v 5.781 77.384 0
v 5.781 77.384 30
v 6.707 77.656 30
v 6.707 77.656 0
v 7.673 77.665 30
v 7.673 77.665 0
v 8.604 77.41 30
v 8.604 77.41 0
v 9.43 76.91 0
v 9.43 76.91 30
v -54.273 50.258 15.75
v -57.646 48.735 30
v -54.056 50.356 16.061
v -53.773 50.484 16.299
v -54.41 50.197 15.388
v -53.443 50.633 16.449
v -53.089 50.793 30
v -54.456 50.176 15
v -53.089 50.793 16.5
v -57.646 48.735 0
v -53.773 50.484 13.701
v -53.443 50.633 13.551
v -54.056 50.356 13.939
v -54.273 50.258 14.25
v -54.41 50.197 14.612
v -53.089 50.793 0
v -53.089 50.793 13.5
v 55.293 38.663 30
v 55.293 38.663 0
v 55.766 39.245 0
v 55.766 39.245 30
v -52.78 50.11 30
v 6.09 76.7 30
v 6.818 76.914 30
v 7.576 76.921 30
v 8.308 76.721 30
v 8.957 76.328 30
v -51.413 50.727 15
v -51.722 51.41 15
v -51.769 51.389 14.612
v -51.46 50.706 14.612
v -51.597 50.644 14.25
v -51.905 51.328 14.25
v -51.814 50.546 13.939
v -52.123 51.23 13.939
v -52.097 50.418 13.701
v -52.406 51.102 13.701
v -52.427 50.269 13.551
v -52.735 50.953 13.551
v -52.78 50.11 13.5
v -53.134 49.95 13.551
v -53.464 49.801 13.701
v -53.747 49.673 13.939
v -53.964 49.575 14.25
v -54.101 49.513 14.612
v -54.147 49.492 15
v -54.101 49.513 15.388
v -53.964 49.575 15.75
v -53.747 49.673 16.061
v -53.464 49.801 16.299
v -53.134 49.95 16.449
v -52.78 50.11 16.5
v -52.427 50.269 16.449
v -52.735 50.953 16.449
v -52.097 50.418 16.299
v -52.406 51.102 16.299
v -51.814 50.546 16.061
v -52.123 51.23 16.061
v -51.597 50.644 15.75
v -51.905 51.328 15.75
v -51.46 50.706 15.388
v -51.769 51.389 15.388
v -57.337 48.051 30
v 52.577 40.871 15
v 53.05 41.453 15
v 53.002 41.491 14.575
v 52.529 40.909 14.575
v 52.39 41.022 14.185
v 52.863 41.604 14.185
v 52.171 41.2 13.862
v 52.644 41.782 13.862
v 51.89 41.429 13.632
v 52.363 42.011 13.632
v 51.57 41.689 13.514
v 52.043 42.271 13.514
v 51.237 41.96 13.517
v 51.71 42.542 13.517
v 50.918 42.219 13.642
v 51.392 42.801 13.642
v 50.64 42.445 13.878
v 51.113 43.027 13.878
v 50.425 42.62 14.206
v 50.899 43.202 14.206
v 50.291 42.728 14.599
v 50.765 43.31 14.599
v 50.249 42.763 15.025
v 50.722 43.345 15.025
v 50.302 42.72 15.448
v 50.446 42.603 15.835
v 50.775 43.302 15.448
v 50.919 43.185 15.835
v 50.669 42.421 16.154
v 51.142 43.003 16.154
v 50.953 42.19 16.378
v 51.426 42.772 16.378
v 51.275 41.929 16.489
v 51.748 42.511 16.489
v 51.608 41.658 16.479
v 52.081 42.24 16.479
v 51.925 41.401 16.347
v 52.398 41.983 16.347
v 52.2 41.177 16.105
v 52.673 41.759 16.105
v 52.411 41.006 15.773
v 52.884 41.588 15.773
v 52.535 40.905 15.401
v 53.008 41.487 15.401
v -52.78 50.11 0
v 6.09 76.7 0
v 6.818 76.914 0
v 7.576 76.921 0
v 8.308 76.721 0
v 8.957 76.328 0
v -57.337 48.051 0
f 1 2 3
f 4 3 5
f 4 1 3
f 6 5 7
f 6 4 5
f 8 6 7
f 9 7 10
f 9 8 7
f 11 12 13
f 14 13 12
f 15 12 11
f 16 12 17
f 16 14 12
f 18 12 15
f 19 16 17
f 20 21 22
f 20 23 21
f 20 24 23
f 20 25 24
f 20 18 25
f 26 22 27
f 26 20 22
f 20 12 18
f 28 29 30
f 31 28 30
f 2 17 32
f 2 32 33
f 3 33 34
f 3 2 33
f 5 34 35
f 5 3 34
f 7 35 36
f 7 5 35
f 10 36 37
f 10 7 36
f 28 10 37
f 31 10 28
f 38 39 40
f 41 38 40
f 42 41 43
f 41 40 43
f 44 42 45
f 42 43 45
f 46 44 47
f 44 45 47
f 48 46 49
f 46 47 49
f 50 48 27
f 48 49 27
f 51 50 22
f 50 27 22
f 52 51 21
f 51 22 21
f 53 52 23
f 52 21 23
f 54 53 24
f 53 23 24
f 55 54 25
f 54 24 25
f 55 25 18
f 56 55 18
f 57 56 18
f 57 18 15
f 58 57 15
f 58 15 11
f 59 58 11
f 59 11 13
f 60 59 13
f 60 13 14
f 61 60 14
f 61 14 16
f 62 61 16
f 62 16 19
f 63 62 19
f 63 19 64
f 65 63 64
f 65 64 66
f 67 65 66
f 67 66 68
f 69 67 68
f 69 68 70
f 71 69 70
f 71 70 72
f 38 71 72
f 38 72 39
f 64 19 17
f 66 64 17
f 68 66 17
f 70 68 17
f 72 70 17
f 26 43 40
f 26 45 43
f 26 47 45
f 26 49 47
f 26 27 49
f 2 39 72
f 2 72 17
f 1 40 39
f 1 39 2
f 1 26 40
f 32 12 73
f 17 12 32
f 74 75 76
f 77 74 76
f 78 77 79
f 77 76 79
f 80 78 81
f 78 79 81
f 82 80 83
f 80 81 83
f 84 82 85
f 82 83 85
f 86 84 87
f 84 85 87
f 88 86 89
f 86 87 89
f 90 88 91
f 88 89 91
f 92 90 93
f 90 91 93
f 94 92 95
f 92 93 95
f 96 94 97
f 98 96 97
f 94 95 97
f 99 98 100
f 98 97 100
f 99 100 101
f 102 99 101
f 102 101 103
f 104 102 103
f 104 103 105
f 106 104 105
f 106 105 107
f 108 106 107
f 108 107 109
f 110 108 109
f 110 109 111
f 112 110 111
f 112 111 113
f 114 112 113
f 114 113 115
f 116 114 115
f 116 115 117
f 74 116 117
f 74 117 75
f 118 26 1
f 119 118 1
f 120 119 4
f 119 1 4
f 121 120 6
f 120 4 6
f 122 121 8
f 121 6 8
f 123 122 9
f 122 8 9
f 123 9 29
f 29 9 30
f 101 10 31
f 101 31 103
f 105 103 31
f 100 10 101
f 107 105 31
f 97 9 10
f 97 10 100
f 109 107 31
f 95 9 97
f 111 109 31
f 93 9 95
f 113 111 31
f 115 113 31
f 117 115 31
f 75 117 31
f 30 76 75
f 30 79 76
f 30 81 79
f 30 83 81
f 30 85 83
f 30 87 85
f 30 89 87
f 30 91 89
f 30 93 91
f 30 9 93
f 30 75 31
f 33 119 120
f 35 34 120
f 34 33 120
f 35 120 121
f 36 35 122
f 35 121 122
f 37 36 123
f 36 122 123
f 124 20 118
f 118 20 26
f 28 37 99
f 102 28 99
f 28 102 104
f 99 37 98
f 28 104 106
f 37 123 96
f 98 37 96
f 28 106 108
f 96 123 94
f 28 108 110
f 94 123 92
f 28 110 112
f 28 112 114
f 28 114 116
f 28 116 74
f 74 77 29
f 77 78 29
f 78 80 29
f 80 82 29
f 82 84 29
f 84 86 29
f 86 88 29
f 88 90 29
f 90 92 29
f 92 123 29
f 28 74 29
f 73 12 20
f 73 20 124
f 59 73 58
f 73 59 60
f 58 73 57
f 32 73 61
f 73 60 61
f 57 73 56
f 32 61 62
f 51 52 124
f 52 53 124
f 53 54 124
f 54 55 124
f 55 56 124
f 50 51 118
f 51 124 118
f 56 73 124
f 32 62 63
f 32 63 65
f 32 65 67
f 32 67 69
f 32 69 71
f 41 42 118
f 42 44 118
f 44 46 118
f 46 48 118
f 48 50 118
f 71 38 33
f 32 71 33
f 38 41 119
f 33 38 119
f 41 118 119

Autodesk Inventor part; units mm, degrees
ref_plane "YZ Plane" through (0, 0, 0) normal (1, 0, 0) x (0, 1, 0)
ref_plane "XZ Plane" through (0, 0, 0) normal (0, 1, 0) x (-1, 0, 0)
ref_plane "XY Plane" through (0, 0, 0) normal (0, 0, 1) x (1, 0, 0)
sketch "スケッチ1" plane through (0, 0, 0) normal (0, 0, 1) x (1, 0, 0)
  circle A0 centre (-56.2051, 45.5451) radius 2.75
  arc A1 (8.9566, 76.3281) -> (6.09, 76.7004) centre (7.222, 74.1942) ccw
  circle A2 centre (57.2805, 33.1812) radius 3
  line L0 (-57.3371, 48.0513) -> (6.09, 76.7004)
  line L1 (8.9566, 76.3281) -> (59.1728, 35.5091)
  line L2 (-57.6459, 48.7348) -> (5.7812, 77.3839)
  arc A3 (6.09, 76.7004) -> (8.9566, 76.3281) centre (7.222, 74.1942) ccw
  arc A4 (9.4296, 76.9101) -> (5.7812, 77.3839) centre (7.222, 74.1942) ccw
  line L3 (9.4296, 76.9101) -> (59.6459, 36.0911)
  line L4 (-57.6459, 48.7348) -> (-56.2051, 45.5451)
  line L5 (57.2805, 33.1812) -> (59.6459, 36.0911)
  line L6 (-53.0891, 50.793) -> (-52.7804, 50.1095)
  line L7 (55.2929, 38.663) -> (55.766, 39.2449)
  point P0 (0, 0)
  point P1 (5.7812, 77.3839)
  dimension "d0" = 0.75
  dimension "d1" = 0.75
  dimension "d2" = 0.75
  dimension "d3" = 5
  dimension "d4" = 5
extrude "押し出し1" add sketch "スケッチ1" along normal blind 30 contours L4 L2 L6 L0 | L6 L2 A4 L3 L7 L1 A1 L0
sketch "スケッチ2" plane through (-57.6459, 48.7348, 30) normal (-0.4116, 0.9113, 0) x (0.9113, 0.4116, 0)
  line L0 (69.5972, 30) -> (0, 30) projected
  line L1 (0, 30) -> (0, 0) projected
  line L2 (69.5972, 0) -> (0, 0) projected
  line L3 (69.5972, 30) -> (69.5972, 0) projected
  circle A0 centre (5, 15) radius 1.5
  point P0 (32.474, 30)
  dimension "d7" = 3
  dimension "d8" = 15
  dimension "d9" = 5
extrude "押し出し2" cut sketch "スケッチ2" against normal blind 0.75 contours A0
sketch "スケッチ3" plane through (9.4296, 76.9101, 30) normal (0.6308, 0.776, 0) x (0.776, -0.6308, 0)
  line L0 (59.7137, 30) -> (0, 30) projected
  line L1 (0, 30) -> (0, 0) projected
  line L2 (59.7137, 0) -> (0, 0) projected
  line L3 (59.7137, 30) -> (59.7137, 0) projected
  circle A0 centre (54.7137, 15) radius 1.5
  point P0 (41.1949, 30)
  dimension "d12" = 3
  dimension "d13" = 15
  dimension "d14" = 5
extrude "押し出し3" cut sketch "スケッチ3" against normal blind 0.75 contours A0
properties part number "クランクガード" material "ポリプロピレン"
